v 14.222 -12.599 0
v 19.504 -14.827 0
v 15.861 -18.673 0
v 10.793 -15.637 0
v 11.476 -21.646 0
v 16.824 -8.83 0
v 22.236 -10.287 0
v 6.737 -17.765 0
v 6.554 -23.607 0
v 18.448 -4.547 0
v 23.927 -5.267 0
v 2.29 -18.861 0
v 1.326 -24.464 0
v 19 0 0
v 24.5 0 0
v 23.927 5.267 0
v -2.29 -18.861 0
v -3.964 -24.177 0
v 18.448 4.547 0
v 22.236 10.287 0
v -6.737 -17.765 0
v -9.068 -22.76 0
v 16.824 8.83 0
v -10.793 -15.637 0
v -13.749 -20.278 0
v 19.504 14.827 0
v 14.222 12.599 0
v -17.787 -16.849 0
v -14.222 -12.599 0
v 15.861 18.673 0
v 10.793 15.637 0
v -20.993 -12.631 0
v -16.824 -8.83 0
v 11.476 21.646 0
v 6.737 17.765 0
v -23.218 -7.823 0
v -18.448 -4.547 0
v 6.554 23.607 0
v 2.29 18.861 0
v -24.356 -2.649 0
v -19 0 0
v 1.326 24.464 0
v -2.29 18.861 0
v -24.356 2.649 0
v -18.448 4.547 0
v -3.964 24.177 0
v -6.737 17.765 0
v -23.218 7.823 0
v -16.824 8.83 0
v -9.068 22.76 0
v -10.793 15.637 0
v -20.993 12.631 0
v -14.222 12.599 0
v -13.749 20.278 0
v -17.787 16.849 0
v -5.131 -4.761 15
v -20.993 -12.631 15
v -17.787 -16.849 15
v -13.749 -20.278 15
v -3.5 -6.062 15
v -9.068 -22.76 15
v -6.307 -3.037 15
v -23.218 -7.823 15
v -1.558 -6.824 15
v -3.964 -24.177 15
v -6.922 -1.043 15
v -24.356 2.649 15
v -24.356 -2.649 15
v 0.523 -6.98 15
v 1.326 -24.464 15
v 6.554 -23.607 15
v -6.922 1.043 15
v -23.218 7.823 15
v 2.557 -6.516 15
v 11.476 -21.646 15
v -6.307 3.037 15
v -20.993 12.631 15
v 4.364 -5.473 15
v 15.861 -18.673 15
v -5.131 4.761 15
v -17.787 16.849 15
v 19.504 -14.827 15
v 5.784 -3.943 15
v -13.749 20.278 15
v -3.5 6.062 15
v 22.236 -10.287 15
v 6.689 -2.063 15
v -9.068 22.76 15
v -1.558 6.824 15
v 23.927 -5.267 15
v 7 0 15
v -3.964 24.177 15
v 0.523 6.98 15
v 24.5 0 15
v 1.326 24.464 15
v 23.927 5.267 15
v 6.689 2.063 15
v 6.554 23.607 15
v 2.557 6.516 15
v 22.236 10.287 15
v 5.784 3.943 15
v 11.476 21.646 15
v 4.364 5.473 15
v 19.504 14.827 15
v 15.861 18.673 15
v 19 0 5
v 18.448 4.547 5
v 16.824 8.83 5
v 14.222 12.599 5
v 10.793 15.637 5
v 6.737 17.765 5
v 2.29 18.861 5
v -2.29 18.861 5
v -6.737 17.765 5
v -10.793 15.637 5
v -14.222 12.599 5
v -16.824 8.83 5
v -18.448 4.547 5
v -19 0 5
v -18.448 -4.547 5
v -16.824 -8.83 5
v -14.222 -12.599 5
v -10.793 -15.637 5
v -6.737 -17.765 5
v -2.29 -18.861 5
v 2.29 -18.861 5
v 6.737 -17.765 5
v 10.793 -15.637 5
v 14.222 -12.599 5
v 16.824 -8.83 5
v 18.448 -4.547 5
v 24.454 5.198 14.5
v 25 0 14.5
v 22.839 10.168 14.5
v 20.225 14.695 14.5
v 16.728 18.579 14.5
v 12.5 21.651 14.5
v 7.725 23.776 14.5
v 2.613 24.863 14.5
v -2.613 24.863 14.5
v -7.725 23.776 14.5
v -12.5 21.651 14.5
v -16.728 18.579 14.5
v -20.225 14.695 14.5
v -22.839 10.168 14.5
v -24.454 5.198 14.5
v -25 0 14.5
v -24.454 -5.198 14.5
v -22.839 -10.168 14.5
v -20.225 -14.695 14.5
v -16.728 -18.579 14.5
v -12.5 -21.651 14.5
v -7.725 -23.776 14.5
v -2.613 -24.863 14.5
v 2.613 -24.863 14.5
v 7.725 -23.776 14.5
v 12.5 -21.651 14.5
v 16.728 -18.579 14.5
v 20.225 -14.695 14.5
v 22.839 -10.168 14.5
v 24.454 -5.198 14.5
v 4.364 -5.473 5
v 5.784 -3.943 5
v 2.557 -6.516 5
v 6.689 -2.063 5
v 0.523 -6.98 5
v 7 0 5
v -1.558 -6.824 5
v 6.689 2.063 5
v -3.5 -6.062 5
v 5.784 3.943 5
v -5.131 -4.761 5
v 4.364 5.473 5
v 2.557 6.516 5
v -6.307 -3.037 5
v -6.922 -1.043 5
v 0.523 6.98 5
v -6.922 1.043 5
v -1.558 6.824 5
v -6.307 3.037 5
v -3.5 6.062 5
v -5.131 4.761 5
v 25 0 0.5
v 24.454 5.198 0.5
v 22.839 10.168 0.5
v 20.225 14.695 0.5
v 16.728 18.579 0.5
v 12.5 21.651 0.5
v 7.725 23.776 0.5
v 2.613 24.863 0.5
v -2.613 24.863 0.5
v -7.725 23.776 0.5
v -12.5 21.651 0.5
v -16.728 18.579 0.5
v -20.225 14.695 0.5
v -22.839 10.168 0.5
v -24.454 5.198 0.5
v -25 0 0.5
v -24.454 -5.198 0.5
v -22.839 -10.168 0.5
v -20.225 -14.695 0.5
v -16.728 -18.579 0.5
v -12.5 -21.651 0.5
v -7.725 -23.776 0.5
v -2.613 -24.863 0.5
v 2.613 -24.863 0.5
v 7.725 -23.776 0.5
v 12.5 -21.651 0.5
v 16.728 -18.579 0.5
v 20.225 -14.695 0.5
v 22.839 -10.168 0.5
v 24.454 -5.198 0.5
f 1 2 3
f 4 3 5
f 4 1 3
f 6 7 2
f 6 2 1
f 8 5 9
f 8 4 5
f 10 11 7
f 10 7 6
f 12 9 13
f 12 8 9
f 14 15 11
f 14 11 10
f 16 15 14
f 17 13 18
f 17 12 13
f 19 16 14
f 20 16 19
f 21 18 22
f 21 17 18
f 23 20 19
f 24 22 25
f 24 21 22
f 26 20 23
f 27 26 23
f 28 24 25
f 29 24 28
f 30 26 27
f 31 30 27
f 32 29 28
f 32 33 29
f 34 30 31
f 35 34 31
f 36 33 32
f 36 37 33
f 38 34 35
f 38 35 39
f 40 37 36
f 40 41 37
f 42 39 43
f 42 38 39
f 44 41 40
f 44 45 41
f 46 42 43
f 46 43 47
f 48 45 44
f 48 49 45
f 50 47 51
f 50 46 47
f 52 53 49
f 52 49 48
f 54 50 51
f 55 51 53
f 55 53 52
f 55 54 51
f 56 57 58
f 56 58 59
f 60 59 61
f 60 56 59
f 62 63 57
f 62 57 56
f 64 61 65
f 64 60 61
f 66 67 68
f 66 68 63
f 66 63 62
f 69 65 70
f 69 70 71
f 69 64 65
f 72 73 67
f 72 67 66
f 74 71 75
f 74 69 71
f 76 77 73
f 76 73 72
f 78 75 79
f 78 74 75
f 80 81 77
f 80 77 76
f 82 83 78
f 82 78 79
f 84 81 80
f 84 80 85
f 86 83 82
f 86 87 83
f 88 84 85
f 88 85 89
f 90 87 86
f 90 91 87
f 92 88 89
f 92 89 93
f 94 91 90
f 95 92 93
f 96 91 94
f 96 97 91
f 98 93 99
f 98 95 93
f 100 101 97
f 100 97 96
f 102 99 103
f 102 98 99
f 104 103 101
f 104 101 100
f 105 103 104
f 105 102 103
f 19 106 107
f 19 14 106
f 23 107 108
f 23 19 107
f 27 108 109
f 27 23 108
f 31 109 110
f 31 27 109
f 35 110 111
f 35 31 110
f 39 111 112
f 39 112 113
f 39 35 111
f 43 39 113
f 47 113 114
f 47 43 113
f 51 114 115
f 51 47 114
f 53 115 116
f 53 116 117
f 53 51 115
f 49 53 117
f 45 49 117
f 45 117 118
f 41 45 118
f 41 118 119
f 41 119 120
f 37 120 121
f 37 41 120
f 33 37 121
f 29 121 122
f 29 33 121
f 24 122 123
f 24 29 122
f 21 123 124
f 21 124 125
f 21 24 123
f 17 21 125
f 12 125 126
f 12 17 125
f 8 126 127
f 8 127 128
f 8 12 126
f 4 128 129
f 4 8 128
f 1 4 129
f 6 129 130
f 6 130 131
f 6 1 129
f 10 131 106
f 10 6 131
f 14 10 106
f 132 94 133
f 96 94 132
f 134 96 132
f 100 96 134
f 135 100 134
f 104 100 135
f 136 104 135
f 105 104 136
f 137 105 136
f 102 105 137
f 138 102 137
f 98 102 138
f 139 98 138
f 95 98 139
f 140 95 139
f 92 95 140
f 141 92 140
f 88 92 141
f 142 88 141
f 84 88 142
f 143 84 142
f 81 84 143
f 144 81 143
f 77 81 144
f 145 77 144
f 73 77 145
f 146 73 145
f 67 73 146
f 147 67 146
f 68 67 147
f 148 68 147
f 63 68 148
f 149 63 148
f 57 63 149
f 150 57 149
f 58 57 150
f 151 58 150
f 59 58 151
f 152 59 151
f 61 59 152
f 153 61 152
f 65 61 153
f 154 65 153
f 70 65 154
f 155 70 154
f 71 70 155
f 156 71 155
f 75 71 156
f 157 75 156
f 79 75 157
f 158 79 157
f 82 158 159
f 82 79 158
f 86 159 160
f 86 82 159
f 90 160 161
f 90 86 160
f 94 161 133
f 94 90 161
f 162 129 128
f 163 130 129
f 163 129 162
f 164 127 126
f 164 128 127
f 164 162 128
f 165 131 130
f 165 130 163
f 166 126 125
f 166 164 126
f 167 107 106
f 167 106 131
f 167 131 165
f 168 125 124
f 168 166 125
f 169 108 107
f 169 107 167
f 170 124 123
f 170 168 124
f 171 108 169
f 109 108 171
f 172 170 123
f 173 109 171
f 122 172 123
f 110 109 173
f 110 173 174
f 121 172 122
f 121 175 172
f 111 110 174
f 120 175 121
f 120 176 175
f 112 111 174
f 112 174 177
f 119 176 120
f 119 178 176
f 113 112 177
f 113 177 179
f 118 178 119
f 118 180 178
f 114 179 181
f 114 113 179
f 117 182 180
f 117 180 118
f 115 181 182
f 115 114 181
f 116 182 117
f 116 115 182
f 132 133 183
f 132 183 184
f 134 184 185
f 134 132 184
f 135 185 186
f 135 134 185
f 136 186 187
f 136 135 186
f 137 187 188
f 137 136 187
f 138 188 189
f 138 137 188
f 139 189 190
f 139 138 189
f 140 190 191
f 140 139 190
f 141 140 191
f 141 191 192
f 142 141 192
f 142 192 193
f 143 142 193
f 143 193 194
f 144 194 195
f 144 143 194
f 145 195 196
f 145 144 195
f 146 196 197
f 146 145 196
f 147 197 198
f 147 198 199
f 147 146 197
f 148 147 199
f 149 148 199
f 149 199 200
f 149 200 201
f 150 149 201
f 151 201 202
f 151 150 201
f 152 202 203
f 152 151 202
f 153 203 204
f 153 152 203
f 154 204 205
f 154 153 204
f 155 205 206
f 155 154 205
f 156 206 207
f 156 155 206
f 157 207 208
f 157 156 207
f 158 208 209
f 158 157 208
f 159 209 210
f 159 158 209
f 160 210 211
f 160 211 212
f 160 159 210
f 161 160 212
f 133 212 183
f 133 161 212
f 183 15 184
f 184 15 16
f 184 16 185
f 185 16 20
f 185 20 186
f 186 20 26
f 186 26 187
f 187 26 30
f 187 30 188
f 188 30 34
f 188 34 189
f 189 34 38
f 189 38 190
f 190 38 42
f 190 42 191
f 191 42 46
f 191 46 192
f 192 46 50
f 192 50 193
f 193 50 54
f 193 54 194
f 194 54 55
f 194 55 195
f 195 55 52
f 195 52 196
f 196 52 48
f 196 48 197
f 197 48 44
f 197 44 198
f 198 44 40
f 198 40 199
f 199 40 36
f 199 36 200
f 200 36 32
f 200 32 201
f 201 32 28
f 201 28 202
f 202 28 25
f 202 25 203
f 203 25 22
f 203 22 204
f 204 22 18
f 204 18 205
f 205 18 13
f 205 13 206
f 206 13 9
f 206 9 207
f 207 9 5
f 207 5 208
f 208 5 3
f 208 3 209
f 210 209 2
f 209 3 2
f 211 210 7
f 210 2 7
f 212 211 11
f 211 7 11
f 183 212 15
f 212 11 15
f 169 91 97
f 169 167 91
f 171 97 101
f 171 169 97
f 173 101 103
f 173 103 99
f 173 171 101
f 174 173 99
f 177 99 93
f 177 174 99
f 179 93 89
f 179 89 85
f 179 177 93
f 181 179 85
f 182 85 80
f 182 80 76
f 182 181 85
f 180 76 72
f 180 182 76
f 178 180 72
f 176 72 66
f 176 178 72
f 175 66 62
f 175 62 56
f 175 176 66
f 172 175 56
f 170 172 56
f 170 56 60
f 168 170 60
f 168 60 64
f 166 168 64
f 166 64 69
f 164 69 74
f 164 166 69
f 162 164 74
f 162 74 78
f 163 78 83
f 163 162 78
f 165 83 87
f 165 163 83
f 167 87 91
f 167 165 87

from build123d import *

# Parameters (mm, degrees)
F2_SIZE = 0.5
F3_SIZE = 0.5


with BuildPart() as f1:
    # F0 (on Front) → F1 (revolve)
    with BuildSketch(Plane.XZ):
        Polygon((19, 5), (19, 0), (25, 0), (25, 15), (7, 15), (7, 5), align=None)
    revolve(axis=Axis((0, 0, 18.669182), (0, 0, 1)))

    # F2
    f2_edges = [f1.edges().sort_by_distance(p)[0] for p in [
        (-25, 0, 15),
    ]]
    chamfer(f2_edges, length=F2_SIZE)

    # F3
    f3_edges = [f1.edges().sort_by_distance(p)[0] for p in [
        (-25, 0, 0),
    ]]
    chamfer(f3_edges, length=F3_SIZE)


solid = f1.part
